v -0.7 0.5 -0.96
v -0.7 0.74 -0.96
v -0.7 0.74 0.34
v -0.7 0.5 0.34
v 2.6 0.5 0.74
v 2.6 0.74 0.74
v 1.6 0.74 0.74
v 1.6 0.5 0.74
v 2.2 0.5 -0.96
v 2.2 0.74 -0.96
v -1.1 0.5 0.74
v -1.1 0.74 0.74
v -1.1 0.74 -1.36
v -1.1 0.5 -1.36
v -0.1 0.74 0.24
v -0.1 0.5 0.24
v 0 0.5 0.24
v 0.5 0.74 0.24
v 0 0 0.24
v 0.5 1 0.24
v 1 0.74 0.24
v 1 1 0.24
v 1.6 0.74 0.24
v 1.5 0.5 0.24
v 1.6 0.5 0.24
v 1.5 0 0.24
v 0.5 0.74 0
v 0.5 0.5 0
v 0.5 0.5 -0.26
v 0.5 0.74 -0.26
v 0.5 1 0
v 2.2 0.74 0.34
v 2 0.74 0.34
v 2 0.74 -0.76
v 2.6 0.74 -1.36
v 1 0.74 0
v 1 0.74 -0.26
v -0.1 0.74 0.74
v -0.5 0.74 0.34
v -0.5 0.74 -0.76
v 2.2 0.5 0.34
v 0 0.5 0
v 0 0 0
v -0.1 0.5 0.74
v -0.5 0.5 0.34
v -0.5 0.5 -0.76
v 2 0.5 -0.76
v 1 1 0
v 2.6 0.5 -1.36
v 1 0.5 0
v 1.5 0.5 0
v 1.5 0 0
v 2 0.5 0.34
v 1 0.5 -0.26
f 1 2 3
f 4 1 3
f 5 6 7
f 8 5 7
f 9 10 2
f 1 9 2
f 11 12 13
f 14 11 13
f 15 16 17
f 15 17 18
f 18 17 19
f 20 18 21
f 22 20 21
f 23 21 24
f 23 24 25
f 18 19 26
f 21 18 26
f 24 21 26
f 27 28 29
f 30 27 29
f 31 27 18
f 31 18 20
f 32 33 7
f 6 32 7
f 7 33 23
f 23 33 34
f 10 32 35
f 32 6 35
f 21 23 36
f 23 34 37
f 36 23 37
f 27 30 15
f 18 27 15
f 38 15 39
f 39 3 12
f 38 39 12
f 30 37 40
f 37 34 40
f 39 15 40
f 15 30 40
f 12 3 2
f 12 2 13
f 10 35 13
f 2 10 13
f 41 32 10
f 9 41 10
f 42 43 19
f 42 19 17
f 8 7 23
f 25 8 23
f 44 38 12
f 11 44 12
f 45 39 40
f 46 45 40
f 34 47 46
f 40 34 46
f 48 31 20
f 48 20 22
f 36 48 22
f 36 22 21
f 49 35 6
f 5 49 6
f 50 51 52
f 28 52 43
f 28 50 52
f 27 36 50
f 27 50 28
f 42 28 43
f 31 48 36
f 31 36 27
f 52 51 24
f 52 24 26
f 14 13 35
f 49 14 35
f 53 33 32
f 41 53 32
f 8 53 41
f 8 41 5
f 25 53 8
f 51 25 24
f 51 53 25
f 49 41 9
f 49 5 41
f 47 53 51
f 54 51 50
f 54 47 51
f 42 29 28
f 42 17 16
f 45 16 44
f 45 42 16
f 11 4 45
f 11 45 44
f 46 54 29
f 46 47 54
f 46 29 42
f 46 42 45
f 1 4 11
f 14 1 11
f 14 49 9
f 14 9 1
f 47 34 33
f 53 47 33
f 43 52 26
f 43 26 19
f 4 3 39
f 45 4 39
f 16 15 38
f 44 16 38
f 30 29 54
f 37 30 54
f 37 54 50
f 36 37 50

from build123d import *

# Parameters (mm, degrees)
BOSS_EXTRUDE1_DEPTH = 0.24
BOSS_EXTRUDE2_DEPTH = 0.24
BOSS_EXTRUDE3_DEPTH = 0.24


with BuildPart() as part:
    # Sketch2 → Boss-Extrude1 (new body)
    with BuildSketch(Plane.XY):
        Polygon((0, 0), (0, 0.5), (0.5, 0.5), (0.5, 1), (1, 1), (1, 0.5), (1.5, 0.5), (1.5, 0), align=None)
    extrude(amount=BOSS_EXTRUDE1_DEPTH)

    # Sketch3 → Boss-Extrude2 (add)
    with BuildSketch(Plane(origin=(0, 0.5, 0), x_dir=(1, 0, 0), z_dir=(0, 1, 0))):
        Polygon((0.5, -0.24), (0.5, 0.26), (1, 0.26), (1, -0.24), (2, -0.24), (2, 0.76), (-0.5, 0.76), (-0.5, -0.24), align=None)
    extrude(amount=BOSS_EXTRUDE2_DEPTH)

    # Sketch4 → Boss-Extrude3 (add)
    with BuildSketch(Plane(origin=(0, 0.74, 0), x_dir=(1, 0, 0), z_dir=(0, 1, 0))):
        Polygon((-0.1, -0.24), (-0.1, -0.74), (-1.1, -0.74), (-1.1, 1.36), (2.6, 1.36), (2.6, -0.74), (1.6, -0.74), (1.6, -0.24), (2, -0.24), (2, -0.34), (2.2, -0.34), (2.2, 0.96), (-0.7, 0.96), (-0.7, -0.34), (-0.5, -0.34), (-0.5, -0.24), align=None)
    extrude(amount=-BOSS_EXTRUDE3_DEPTH)


solid = part.part
